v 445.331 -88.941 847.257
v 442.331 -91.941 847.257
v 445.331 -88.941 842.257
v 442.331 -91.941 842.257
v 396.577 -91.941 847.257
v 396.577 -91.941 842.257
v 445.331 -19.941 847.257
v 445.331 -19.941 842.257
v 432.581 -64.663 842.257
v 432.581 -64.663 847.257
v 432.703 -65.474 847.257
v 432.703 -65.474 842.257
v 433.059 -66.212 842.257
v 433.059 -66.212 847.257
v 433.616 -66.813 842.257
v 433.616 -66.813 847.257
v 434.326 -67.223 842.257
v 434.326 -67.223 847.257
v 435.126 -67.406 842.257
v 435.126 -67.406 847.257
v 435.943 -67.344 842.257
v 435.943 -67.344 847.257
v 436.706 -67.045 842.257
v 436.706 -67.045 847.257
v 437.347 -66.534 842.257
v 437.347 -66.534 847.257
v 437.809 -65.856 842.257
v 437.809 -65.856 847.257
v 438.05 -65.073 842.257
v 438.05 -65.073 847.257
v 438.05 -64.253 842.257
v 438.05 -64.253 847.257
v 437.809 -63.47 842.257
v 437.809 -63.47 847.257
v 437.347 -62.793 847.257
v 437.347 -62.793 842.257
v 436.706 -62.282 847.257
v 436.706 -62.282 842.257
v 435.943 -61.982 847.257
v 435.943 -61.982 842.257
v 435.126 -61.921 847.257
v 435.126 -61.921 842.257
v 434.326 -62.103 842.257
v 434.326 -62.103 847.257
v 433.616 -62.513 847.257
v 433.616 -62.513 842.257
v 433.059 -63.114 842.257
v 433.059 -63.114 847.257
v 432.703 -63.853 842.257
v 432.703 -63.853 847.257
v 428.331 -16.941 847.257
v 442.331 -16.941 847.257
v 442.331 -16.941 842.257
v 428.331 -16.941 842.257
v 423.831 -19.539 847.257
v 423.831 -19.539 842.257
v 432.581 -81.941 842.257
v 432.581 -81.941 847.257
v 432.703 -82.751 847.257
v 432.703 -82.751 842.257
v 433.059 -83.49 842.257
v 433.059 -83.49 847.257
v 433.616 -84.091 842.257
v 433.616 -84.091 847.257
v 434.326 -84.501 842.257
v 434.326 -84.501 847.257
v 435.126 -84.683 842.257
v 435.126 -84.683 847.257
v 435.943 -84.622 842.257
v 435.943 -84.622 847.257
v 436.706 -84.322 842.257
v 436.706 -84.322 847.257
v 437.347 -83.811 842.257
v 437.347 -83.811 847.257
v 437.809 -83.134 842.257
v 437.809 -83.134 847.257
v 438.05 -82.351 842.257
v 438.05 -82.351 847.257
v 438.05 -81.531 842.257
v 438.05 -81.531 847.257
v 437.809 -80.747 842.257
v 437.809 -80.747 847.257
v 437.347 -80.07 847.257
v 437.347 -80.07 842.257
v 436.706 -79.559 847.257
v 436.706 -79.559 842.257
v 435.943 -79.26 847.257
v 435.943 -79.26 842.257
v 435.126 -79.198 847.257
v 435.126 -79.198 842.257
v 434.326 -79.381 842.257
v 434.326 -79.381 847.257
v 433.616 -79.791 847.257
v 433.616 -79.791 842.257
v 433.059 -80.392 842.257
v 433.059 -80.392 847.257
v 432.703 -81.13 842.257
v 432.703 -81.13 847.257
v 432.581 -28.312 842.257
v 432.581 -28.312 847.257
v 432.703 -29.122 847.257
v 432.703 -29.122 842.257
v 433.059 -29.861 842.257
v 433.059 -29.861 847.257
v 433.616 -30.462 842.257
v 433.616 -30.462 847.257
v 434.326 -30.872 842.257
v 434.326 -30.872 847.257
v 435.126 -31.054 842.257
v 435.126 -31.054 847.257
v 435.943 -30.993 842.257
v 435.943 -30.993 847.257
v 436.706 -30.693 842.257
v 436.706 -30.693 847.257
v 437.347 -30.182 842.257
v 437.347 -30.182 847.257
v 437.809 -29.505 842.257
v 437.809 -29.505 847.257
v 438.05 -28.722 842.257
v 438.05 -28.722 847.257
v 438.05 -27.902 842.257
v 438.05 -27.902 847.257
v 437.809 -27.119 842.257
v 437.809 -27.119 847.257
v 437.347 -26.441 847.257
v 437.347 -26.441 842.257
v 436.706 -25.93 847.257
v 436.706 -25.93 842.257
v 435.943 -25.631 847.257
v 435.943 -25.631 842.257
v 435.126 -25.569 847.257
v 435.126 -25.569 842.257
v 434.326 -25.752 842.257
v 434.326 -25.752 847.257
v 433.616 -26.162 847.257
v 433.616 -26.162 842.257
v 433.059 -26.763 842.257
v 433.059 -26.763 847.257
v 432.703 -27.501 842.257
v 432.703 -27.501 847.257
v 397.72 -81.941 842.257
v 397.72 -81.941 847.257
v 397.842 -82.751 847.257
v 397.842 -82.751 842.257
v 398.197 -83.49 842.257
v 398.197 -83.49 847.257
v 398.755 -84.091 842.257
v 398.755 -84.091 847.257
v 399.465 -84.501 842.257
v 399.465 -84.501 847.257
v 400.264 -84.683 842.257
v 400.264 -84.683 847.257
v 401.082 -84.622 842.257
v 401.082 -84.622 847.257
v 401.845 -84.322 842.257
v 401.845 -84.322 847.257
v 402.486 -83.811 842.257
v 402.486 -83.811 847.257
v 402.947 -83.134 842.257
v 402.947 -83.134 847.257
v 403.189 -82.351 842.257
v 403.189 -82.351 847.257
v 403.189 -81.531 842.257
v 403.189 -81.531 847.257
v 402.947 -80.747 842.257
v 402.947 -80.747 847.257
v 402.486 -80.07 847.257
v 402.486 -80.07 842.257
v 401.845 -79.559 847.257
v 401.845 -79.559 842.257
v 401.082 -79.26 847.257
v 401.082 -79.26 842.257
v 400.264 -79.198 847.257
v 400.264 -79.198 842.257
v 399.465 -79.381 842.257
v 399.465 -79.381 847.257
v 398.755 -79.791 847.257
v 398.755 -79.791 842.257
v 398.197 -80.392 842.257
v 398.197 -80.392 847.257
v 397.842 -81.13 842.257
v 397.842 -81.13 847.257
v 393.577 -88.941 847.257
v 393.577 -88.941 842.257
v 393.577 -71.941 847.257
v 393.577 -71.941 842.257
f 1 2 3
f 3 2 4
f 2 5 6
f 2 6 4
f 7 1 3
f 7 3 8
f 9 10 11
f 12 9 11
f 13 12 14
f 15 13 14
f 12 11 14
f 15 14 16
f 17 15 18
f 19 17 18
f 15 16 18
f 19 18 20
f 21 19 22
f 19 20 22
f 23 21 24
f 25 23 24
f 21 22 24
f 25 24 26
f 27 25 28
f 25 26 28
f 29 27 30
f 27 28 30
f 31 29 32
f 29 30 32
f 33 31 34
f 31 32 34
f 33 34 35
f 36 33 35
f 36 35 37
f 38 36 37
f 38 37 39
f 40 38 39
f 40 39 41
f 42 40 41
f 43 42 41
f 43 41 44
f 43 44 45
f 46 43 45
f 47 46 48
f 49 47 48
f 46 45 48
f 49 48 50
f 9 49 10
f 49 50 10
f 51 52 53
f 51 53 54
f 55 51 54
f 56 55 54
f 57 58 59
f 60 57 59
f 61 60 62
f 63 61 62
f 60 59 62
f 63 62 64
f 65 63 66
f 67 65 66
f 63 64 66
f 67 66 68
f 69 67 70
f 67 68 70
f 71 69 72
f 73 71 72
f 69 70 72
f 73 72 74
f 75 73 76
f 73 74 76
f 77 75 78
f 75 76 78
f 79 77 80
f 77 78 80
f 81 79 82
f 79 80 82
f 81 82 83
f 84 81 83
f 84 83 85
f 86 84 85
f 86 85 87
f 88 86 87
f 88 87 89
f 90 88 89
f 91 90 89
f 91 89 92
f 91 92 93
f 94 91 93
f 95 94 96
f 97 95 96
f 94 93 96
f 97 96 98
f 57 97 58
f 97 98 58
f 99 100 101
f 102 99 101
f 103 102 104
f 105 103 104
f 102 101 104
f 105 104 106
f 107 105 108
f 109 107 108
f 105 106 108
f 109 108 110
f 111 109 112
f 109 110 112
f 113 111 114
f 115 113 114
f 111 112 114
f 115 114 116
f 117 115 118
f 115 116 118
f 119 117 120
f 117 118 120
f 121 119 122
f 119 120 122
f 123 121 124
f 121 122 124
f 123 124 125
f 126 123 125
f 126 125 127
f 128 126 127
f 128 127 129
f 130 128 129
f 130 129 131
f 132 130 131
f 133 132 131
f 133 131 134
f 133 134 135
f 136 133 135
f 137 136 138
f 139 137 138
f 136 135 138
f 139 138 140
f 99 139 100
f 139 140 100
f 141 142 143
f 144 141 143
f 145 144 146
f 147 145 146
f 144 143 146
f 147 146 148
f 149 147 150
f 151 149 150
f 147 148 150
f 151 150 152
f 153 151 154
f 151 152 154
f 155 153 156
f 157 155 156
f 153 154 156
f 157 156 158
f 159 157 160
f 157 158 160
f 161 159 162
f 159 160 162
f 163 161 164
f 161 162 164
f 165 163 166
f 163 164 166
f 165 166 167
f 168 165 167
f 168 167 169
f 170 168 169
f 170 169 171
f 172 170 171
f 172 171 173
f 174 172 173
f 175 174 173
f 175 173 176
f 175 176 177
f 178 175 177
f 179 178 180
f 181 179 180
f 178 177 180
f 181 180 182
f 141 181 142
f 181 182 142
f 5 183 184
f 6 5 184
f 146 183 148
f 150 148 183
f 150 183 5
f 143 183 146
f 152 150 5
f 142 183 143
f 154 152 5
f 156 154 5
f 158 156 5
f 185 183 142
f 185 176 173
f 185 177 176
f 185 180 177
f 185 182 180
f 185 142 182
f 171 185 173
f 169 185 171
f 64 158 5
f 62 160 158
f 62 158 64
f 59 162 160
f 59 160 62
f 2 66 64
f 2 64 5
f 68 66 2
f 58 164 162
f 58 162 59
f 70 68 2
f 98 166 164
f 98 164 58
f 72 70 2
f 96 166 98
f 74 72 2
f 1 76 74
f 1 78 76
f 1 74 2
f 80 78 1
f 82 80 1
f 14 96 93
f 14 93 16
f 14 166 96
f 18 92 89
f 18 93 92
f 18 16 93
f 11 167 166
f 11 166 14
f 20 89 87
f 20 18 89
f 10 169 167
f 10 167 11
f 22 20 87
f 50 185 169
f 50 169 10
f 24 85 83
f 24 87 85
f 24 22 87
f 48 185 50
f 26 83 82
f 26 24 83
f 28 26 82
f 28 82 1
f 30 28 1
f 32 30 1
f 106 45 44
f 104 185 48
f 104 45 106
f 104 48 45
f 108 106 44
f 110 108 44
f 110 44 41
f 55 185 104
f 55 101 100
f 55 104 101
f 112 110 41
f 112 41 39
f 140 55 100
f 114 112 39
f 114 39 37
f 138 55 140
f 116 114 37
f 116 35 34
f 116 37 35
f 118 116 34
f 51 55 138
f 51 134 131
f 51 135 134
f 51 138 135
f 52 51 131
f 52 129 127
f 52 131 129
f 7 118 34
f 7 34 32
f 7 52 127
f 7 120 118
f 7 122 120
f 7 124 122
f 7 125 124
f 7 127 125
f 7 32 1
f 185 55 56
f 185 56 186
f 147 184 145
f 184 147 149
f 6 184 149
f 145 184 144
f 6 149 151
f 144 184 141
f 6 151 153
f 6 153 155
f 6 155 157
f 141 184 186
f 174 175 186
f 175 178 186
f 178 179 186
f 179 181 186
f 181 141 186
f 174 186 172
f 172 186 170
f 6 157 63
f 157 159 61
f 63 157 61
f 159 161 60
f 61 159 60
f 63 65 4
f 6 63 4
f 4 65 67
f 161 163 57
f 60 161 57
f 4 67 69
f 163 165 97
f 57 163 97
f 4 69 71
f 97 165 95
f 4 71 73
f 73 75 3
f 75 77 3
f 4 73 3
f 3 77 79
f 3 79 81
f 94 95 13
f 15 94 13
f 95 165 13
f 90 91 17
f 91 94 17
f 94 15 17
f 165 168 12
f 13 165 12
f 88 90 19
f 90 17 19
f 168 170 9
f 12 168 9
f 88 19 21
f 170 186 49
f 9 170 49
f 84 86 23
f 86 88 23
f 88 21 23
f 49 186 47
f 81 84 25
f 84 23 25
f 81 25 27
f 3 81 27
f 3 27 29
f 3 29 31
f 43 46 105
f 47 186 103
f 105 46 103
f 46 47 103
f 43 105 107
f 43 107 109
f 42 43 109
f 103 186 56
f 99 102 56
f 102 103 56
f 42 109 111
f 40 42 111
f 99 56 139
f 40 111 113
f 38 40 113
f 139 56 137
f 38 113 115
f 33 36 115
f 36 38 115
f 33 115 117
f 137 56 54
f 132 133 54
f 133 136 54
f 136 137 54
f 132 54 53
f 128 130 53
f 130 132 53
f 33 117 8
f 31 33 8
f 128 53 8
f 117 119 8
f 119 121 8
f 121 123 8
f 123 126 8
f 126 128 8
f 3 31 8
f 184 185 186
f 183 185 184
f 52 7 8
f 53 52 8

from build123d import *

# Parameters (mm, degrees)
SKETCH1_R           = 2.75
BOSS_EXTRUDE1_DEPTH = 5
CHAMFER1_SIZE       = 3


with BuildPart() as part:
    # Sketch1 → Boss-Extrude1 (new body)
    with BuildSketch(Plane.XY.offset(847.256699138)):
        Polygon((445.331056746, -16.940654003), (425.331056746, -16.940654003), (393.576791941, -71.940654003), (393.576791941, -91.940654003), (445.331056746, -91.940654003), align=None)
        with Locations(Location((435.331056746, -28.311683021, 0), (0, 0, 180))):
            Circle(SKETCH1_R, mode=Mode.SUBTRACT)
        with Locations(Location((435.331056746, -64.663237098, 0), (0, 0, 180))):
            Circle(SKETCH1_R, mode=Mode.SUBTRACT)
        with Locations(Location((400.469639923, -81.940654003, 0), (0, 0, 180))):
            Circle(SKETCH1_R, mode=Mode.SUBTRACT)
        with Locations(Location((435.331056746, -81.940654003, 0), (0, 0, 180))):
            Circle(SKETCH1_R, mode=Mode.SUBTRACT)
    extrude(amount=-BOSS_EXTRUDE1_DEPTH)

    # Chamfer1
    chamfer1_edges = [part.edges().sort_by_distance(p)[0] for p in [
        (445.331056746, -91.940654003, 844.756699138),
        (393.576791941, -91.940654003, 844.756699138),
        (425.331056746, -16.940654003, 844.756699138),
        (445.331056746, -16.940654003, 844.756699138),
    ]]
    chamfer(chamfer1_edges, length=CHAMFER1_SIZE)


solid = part.part
